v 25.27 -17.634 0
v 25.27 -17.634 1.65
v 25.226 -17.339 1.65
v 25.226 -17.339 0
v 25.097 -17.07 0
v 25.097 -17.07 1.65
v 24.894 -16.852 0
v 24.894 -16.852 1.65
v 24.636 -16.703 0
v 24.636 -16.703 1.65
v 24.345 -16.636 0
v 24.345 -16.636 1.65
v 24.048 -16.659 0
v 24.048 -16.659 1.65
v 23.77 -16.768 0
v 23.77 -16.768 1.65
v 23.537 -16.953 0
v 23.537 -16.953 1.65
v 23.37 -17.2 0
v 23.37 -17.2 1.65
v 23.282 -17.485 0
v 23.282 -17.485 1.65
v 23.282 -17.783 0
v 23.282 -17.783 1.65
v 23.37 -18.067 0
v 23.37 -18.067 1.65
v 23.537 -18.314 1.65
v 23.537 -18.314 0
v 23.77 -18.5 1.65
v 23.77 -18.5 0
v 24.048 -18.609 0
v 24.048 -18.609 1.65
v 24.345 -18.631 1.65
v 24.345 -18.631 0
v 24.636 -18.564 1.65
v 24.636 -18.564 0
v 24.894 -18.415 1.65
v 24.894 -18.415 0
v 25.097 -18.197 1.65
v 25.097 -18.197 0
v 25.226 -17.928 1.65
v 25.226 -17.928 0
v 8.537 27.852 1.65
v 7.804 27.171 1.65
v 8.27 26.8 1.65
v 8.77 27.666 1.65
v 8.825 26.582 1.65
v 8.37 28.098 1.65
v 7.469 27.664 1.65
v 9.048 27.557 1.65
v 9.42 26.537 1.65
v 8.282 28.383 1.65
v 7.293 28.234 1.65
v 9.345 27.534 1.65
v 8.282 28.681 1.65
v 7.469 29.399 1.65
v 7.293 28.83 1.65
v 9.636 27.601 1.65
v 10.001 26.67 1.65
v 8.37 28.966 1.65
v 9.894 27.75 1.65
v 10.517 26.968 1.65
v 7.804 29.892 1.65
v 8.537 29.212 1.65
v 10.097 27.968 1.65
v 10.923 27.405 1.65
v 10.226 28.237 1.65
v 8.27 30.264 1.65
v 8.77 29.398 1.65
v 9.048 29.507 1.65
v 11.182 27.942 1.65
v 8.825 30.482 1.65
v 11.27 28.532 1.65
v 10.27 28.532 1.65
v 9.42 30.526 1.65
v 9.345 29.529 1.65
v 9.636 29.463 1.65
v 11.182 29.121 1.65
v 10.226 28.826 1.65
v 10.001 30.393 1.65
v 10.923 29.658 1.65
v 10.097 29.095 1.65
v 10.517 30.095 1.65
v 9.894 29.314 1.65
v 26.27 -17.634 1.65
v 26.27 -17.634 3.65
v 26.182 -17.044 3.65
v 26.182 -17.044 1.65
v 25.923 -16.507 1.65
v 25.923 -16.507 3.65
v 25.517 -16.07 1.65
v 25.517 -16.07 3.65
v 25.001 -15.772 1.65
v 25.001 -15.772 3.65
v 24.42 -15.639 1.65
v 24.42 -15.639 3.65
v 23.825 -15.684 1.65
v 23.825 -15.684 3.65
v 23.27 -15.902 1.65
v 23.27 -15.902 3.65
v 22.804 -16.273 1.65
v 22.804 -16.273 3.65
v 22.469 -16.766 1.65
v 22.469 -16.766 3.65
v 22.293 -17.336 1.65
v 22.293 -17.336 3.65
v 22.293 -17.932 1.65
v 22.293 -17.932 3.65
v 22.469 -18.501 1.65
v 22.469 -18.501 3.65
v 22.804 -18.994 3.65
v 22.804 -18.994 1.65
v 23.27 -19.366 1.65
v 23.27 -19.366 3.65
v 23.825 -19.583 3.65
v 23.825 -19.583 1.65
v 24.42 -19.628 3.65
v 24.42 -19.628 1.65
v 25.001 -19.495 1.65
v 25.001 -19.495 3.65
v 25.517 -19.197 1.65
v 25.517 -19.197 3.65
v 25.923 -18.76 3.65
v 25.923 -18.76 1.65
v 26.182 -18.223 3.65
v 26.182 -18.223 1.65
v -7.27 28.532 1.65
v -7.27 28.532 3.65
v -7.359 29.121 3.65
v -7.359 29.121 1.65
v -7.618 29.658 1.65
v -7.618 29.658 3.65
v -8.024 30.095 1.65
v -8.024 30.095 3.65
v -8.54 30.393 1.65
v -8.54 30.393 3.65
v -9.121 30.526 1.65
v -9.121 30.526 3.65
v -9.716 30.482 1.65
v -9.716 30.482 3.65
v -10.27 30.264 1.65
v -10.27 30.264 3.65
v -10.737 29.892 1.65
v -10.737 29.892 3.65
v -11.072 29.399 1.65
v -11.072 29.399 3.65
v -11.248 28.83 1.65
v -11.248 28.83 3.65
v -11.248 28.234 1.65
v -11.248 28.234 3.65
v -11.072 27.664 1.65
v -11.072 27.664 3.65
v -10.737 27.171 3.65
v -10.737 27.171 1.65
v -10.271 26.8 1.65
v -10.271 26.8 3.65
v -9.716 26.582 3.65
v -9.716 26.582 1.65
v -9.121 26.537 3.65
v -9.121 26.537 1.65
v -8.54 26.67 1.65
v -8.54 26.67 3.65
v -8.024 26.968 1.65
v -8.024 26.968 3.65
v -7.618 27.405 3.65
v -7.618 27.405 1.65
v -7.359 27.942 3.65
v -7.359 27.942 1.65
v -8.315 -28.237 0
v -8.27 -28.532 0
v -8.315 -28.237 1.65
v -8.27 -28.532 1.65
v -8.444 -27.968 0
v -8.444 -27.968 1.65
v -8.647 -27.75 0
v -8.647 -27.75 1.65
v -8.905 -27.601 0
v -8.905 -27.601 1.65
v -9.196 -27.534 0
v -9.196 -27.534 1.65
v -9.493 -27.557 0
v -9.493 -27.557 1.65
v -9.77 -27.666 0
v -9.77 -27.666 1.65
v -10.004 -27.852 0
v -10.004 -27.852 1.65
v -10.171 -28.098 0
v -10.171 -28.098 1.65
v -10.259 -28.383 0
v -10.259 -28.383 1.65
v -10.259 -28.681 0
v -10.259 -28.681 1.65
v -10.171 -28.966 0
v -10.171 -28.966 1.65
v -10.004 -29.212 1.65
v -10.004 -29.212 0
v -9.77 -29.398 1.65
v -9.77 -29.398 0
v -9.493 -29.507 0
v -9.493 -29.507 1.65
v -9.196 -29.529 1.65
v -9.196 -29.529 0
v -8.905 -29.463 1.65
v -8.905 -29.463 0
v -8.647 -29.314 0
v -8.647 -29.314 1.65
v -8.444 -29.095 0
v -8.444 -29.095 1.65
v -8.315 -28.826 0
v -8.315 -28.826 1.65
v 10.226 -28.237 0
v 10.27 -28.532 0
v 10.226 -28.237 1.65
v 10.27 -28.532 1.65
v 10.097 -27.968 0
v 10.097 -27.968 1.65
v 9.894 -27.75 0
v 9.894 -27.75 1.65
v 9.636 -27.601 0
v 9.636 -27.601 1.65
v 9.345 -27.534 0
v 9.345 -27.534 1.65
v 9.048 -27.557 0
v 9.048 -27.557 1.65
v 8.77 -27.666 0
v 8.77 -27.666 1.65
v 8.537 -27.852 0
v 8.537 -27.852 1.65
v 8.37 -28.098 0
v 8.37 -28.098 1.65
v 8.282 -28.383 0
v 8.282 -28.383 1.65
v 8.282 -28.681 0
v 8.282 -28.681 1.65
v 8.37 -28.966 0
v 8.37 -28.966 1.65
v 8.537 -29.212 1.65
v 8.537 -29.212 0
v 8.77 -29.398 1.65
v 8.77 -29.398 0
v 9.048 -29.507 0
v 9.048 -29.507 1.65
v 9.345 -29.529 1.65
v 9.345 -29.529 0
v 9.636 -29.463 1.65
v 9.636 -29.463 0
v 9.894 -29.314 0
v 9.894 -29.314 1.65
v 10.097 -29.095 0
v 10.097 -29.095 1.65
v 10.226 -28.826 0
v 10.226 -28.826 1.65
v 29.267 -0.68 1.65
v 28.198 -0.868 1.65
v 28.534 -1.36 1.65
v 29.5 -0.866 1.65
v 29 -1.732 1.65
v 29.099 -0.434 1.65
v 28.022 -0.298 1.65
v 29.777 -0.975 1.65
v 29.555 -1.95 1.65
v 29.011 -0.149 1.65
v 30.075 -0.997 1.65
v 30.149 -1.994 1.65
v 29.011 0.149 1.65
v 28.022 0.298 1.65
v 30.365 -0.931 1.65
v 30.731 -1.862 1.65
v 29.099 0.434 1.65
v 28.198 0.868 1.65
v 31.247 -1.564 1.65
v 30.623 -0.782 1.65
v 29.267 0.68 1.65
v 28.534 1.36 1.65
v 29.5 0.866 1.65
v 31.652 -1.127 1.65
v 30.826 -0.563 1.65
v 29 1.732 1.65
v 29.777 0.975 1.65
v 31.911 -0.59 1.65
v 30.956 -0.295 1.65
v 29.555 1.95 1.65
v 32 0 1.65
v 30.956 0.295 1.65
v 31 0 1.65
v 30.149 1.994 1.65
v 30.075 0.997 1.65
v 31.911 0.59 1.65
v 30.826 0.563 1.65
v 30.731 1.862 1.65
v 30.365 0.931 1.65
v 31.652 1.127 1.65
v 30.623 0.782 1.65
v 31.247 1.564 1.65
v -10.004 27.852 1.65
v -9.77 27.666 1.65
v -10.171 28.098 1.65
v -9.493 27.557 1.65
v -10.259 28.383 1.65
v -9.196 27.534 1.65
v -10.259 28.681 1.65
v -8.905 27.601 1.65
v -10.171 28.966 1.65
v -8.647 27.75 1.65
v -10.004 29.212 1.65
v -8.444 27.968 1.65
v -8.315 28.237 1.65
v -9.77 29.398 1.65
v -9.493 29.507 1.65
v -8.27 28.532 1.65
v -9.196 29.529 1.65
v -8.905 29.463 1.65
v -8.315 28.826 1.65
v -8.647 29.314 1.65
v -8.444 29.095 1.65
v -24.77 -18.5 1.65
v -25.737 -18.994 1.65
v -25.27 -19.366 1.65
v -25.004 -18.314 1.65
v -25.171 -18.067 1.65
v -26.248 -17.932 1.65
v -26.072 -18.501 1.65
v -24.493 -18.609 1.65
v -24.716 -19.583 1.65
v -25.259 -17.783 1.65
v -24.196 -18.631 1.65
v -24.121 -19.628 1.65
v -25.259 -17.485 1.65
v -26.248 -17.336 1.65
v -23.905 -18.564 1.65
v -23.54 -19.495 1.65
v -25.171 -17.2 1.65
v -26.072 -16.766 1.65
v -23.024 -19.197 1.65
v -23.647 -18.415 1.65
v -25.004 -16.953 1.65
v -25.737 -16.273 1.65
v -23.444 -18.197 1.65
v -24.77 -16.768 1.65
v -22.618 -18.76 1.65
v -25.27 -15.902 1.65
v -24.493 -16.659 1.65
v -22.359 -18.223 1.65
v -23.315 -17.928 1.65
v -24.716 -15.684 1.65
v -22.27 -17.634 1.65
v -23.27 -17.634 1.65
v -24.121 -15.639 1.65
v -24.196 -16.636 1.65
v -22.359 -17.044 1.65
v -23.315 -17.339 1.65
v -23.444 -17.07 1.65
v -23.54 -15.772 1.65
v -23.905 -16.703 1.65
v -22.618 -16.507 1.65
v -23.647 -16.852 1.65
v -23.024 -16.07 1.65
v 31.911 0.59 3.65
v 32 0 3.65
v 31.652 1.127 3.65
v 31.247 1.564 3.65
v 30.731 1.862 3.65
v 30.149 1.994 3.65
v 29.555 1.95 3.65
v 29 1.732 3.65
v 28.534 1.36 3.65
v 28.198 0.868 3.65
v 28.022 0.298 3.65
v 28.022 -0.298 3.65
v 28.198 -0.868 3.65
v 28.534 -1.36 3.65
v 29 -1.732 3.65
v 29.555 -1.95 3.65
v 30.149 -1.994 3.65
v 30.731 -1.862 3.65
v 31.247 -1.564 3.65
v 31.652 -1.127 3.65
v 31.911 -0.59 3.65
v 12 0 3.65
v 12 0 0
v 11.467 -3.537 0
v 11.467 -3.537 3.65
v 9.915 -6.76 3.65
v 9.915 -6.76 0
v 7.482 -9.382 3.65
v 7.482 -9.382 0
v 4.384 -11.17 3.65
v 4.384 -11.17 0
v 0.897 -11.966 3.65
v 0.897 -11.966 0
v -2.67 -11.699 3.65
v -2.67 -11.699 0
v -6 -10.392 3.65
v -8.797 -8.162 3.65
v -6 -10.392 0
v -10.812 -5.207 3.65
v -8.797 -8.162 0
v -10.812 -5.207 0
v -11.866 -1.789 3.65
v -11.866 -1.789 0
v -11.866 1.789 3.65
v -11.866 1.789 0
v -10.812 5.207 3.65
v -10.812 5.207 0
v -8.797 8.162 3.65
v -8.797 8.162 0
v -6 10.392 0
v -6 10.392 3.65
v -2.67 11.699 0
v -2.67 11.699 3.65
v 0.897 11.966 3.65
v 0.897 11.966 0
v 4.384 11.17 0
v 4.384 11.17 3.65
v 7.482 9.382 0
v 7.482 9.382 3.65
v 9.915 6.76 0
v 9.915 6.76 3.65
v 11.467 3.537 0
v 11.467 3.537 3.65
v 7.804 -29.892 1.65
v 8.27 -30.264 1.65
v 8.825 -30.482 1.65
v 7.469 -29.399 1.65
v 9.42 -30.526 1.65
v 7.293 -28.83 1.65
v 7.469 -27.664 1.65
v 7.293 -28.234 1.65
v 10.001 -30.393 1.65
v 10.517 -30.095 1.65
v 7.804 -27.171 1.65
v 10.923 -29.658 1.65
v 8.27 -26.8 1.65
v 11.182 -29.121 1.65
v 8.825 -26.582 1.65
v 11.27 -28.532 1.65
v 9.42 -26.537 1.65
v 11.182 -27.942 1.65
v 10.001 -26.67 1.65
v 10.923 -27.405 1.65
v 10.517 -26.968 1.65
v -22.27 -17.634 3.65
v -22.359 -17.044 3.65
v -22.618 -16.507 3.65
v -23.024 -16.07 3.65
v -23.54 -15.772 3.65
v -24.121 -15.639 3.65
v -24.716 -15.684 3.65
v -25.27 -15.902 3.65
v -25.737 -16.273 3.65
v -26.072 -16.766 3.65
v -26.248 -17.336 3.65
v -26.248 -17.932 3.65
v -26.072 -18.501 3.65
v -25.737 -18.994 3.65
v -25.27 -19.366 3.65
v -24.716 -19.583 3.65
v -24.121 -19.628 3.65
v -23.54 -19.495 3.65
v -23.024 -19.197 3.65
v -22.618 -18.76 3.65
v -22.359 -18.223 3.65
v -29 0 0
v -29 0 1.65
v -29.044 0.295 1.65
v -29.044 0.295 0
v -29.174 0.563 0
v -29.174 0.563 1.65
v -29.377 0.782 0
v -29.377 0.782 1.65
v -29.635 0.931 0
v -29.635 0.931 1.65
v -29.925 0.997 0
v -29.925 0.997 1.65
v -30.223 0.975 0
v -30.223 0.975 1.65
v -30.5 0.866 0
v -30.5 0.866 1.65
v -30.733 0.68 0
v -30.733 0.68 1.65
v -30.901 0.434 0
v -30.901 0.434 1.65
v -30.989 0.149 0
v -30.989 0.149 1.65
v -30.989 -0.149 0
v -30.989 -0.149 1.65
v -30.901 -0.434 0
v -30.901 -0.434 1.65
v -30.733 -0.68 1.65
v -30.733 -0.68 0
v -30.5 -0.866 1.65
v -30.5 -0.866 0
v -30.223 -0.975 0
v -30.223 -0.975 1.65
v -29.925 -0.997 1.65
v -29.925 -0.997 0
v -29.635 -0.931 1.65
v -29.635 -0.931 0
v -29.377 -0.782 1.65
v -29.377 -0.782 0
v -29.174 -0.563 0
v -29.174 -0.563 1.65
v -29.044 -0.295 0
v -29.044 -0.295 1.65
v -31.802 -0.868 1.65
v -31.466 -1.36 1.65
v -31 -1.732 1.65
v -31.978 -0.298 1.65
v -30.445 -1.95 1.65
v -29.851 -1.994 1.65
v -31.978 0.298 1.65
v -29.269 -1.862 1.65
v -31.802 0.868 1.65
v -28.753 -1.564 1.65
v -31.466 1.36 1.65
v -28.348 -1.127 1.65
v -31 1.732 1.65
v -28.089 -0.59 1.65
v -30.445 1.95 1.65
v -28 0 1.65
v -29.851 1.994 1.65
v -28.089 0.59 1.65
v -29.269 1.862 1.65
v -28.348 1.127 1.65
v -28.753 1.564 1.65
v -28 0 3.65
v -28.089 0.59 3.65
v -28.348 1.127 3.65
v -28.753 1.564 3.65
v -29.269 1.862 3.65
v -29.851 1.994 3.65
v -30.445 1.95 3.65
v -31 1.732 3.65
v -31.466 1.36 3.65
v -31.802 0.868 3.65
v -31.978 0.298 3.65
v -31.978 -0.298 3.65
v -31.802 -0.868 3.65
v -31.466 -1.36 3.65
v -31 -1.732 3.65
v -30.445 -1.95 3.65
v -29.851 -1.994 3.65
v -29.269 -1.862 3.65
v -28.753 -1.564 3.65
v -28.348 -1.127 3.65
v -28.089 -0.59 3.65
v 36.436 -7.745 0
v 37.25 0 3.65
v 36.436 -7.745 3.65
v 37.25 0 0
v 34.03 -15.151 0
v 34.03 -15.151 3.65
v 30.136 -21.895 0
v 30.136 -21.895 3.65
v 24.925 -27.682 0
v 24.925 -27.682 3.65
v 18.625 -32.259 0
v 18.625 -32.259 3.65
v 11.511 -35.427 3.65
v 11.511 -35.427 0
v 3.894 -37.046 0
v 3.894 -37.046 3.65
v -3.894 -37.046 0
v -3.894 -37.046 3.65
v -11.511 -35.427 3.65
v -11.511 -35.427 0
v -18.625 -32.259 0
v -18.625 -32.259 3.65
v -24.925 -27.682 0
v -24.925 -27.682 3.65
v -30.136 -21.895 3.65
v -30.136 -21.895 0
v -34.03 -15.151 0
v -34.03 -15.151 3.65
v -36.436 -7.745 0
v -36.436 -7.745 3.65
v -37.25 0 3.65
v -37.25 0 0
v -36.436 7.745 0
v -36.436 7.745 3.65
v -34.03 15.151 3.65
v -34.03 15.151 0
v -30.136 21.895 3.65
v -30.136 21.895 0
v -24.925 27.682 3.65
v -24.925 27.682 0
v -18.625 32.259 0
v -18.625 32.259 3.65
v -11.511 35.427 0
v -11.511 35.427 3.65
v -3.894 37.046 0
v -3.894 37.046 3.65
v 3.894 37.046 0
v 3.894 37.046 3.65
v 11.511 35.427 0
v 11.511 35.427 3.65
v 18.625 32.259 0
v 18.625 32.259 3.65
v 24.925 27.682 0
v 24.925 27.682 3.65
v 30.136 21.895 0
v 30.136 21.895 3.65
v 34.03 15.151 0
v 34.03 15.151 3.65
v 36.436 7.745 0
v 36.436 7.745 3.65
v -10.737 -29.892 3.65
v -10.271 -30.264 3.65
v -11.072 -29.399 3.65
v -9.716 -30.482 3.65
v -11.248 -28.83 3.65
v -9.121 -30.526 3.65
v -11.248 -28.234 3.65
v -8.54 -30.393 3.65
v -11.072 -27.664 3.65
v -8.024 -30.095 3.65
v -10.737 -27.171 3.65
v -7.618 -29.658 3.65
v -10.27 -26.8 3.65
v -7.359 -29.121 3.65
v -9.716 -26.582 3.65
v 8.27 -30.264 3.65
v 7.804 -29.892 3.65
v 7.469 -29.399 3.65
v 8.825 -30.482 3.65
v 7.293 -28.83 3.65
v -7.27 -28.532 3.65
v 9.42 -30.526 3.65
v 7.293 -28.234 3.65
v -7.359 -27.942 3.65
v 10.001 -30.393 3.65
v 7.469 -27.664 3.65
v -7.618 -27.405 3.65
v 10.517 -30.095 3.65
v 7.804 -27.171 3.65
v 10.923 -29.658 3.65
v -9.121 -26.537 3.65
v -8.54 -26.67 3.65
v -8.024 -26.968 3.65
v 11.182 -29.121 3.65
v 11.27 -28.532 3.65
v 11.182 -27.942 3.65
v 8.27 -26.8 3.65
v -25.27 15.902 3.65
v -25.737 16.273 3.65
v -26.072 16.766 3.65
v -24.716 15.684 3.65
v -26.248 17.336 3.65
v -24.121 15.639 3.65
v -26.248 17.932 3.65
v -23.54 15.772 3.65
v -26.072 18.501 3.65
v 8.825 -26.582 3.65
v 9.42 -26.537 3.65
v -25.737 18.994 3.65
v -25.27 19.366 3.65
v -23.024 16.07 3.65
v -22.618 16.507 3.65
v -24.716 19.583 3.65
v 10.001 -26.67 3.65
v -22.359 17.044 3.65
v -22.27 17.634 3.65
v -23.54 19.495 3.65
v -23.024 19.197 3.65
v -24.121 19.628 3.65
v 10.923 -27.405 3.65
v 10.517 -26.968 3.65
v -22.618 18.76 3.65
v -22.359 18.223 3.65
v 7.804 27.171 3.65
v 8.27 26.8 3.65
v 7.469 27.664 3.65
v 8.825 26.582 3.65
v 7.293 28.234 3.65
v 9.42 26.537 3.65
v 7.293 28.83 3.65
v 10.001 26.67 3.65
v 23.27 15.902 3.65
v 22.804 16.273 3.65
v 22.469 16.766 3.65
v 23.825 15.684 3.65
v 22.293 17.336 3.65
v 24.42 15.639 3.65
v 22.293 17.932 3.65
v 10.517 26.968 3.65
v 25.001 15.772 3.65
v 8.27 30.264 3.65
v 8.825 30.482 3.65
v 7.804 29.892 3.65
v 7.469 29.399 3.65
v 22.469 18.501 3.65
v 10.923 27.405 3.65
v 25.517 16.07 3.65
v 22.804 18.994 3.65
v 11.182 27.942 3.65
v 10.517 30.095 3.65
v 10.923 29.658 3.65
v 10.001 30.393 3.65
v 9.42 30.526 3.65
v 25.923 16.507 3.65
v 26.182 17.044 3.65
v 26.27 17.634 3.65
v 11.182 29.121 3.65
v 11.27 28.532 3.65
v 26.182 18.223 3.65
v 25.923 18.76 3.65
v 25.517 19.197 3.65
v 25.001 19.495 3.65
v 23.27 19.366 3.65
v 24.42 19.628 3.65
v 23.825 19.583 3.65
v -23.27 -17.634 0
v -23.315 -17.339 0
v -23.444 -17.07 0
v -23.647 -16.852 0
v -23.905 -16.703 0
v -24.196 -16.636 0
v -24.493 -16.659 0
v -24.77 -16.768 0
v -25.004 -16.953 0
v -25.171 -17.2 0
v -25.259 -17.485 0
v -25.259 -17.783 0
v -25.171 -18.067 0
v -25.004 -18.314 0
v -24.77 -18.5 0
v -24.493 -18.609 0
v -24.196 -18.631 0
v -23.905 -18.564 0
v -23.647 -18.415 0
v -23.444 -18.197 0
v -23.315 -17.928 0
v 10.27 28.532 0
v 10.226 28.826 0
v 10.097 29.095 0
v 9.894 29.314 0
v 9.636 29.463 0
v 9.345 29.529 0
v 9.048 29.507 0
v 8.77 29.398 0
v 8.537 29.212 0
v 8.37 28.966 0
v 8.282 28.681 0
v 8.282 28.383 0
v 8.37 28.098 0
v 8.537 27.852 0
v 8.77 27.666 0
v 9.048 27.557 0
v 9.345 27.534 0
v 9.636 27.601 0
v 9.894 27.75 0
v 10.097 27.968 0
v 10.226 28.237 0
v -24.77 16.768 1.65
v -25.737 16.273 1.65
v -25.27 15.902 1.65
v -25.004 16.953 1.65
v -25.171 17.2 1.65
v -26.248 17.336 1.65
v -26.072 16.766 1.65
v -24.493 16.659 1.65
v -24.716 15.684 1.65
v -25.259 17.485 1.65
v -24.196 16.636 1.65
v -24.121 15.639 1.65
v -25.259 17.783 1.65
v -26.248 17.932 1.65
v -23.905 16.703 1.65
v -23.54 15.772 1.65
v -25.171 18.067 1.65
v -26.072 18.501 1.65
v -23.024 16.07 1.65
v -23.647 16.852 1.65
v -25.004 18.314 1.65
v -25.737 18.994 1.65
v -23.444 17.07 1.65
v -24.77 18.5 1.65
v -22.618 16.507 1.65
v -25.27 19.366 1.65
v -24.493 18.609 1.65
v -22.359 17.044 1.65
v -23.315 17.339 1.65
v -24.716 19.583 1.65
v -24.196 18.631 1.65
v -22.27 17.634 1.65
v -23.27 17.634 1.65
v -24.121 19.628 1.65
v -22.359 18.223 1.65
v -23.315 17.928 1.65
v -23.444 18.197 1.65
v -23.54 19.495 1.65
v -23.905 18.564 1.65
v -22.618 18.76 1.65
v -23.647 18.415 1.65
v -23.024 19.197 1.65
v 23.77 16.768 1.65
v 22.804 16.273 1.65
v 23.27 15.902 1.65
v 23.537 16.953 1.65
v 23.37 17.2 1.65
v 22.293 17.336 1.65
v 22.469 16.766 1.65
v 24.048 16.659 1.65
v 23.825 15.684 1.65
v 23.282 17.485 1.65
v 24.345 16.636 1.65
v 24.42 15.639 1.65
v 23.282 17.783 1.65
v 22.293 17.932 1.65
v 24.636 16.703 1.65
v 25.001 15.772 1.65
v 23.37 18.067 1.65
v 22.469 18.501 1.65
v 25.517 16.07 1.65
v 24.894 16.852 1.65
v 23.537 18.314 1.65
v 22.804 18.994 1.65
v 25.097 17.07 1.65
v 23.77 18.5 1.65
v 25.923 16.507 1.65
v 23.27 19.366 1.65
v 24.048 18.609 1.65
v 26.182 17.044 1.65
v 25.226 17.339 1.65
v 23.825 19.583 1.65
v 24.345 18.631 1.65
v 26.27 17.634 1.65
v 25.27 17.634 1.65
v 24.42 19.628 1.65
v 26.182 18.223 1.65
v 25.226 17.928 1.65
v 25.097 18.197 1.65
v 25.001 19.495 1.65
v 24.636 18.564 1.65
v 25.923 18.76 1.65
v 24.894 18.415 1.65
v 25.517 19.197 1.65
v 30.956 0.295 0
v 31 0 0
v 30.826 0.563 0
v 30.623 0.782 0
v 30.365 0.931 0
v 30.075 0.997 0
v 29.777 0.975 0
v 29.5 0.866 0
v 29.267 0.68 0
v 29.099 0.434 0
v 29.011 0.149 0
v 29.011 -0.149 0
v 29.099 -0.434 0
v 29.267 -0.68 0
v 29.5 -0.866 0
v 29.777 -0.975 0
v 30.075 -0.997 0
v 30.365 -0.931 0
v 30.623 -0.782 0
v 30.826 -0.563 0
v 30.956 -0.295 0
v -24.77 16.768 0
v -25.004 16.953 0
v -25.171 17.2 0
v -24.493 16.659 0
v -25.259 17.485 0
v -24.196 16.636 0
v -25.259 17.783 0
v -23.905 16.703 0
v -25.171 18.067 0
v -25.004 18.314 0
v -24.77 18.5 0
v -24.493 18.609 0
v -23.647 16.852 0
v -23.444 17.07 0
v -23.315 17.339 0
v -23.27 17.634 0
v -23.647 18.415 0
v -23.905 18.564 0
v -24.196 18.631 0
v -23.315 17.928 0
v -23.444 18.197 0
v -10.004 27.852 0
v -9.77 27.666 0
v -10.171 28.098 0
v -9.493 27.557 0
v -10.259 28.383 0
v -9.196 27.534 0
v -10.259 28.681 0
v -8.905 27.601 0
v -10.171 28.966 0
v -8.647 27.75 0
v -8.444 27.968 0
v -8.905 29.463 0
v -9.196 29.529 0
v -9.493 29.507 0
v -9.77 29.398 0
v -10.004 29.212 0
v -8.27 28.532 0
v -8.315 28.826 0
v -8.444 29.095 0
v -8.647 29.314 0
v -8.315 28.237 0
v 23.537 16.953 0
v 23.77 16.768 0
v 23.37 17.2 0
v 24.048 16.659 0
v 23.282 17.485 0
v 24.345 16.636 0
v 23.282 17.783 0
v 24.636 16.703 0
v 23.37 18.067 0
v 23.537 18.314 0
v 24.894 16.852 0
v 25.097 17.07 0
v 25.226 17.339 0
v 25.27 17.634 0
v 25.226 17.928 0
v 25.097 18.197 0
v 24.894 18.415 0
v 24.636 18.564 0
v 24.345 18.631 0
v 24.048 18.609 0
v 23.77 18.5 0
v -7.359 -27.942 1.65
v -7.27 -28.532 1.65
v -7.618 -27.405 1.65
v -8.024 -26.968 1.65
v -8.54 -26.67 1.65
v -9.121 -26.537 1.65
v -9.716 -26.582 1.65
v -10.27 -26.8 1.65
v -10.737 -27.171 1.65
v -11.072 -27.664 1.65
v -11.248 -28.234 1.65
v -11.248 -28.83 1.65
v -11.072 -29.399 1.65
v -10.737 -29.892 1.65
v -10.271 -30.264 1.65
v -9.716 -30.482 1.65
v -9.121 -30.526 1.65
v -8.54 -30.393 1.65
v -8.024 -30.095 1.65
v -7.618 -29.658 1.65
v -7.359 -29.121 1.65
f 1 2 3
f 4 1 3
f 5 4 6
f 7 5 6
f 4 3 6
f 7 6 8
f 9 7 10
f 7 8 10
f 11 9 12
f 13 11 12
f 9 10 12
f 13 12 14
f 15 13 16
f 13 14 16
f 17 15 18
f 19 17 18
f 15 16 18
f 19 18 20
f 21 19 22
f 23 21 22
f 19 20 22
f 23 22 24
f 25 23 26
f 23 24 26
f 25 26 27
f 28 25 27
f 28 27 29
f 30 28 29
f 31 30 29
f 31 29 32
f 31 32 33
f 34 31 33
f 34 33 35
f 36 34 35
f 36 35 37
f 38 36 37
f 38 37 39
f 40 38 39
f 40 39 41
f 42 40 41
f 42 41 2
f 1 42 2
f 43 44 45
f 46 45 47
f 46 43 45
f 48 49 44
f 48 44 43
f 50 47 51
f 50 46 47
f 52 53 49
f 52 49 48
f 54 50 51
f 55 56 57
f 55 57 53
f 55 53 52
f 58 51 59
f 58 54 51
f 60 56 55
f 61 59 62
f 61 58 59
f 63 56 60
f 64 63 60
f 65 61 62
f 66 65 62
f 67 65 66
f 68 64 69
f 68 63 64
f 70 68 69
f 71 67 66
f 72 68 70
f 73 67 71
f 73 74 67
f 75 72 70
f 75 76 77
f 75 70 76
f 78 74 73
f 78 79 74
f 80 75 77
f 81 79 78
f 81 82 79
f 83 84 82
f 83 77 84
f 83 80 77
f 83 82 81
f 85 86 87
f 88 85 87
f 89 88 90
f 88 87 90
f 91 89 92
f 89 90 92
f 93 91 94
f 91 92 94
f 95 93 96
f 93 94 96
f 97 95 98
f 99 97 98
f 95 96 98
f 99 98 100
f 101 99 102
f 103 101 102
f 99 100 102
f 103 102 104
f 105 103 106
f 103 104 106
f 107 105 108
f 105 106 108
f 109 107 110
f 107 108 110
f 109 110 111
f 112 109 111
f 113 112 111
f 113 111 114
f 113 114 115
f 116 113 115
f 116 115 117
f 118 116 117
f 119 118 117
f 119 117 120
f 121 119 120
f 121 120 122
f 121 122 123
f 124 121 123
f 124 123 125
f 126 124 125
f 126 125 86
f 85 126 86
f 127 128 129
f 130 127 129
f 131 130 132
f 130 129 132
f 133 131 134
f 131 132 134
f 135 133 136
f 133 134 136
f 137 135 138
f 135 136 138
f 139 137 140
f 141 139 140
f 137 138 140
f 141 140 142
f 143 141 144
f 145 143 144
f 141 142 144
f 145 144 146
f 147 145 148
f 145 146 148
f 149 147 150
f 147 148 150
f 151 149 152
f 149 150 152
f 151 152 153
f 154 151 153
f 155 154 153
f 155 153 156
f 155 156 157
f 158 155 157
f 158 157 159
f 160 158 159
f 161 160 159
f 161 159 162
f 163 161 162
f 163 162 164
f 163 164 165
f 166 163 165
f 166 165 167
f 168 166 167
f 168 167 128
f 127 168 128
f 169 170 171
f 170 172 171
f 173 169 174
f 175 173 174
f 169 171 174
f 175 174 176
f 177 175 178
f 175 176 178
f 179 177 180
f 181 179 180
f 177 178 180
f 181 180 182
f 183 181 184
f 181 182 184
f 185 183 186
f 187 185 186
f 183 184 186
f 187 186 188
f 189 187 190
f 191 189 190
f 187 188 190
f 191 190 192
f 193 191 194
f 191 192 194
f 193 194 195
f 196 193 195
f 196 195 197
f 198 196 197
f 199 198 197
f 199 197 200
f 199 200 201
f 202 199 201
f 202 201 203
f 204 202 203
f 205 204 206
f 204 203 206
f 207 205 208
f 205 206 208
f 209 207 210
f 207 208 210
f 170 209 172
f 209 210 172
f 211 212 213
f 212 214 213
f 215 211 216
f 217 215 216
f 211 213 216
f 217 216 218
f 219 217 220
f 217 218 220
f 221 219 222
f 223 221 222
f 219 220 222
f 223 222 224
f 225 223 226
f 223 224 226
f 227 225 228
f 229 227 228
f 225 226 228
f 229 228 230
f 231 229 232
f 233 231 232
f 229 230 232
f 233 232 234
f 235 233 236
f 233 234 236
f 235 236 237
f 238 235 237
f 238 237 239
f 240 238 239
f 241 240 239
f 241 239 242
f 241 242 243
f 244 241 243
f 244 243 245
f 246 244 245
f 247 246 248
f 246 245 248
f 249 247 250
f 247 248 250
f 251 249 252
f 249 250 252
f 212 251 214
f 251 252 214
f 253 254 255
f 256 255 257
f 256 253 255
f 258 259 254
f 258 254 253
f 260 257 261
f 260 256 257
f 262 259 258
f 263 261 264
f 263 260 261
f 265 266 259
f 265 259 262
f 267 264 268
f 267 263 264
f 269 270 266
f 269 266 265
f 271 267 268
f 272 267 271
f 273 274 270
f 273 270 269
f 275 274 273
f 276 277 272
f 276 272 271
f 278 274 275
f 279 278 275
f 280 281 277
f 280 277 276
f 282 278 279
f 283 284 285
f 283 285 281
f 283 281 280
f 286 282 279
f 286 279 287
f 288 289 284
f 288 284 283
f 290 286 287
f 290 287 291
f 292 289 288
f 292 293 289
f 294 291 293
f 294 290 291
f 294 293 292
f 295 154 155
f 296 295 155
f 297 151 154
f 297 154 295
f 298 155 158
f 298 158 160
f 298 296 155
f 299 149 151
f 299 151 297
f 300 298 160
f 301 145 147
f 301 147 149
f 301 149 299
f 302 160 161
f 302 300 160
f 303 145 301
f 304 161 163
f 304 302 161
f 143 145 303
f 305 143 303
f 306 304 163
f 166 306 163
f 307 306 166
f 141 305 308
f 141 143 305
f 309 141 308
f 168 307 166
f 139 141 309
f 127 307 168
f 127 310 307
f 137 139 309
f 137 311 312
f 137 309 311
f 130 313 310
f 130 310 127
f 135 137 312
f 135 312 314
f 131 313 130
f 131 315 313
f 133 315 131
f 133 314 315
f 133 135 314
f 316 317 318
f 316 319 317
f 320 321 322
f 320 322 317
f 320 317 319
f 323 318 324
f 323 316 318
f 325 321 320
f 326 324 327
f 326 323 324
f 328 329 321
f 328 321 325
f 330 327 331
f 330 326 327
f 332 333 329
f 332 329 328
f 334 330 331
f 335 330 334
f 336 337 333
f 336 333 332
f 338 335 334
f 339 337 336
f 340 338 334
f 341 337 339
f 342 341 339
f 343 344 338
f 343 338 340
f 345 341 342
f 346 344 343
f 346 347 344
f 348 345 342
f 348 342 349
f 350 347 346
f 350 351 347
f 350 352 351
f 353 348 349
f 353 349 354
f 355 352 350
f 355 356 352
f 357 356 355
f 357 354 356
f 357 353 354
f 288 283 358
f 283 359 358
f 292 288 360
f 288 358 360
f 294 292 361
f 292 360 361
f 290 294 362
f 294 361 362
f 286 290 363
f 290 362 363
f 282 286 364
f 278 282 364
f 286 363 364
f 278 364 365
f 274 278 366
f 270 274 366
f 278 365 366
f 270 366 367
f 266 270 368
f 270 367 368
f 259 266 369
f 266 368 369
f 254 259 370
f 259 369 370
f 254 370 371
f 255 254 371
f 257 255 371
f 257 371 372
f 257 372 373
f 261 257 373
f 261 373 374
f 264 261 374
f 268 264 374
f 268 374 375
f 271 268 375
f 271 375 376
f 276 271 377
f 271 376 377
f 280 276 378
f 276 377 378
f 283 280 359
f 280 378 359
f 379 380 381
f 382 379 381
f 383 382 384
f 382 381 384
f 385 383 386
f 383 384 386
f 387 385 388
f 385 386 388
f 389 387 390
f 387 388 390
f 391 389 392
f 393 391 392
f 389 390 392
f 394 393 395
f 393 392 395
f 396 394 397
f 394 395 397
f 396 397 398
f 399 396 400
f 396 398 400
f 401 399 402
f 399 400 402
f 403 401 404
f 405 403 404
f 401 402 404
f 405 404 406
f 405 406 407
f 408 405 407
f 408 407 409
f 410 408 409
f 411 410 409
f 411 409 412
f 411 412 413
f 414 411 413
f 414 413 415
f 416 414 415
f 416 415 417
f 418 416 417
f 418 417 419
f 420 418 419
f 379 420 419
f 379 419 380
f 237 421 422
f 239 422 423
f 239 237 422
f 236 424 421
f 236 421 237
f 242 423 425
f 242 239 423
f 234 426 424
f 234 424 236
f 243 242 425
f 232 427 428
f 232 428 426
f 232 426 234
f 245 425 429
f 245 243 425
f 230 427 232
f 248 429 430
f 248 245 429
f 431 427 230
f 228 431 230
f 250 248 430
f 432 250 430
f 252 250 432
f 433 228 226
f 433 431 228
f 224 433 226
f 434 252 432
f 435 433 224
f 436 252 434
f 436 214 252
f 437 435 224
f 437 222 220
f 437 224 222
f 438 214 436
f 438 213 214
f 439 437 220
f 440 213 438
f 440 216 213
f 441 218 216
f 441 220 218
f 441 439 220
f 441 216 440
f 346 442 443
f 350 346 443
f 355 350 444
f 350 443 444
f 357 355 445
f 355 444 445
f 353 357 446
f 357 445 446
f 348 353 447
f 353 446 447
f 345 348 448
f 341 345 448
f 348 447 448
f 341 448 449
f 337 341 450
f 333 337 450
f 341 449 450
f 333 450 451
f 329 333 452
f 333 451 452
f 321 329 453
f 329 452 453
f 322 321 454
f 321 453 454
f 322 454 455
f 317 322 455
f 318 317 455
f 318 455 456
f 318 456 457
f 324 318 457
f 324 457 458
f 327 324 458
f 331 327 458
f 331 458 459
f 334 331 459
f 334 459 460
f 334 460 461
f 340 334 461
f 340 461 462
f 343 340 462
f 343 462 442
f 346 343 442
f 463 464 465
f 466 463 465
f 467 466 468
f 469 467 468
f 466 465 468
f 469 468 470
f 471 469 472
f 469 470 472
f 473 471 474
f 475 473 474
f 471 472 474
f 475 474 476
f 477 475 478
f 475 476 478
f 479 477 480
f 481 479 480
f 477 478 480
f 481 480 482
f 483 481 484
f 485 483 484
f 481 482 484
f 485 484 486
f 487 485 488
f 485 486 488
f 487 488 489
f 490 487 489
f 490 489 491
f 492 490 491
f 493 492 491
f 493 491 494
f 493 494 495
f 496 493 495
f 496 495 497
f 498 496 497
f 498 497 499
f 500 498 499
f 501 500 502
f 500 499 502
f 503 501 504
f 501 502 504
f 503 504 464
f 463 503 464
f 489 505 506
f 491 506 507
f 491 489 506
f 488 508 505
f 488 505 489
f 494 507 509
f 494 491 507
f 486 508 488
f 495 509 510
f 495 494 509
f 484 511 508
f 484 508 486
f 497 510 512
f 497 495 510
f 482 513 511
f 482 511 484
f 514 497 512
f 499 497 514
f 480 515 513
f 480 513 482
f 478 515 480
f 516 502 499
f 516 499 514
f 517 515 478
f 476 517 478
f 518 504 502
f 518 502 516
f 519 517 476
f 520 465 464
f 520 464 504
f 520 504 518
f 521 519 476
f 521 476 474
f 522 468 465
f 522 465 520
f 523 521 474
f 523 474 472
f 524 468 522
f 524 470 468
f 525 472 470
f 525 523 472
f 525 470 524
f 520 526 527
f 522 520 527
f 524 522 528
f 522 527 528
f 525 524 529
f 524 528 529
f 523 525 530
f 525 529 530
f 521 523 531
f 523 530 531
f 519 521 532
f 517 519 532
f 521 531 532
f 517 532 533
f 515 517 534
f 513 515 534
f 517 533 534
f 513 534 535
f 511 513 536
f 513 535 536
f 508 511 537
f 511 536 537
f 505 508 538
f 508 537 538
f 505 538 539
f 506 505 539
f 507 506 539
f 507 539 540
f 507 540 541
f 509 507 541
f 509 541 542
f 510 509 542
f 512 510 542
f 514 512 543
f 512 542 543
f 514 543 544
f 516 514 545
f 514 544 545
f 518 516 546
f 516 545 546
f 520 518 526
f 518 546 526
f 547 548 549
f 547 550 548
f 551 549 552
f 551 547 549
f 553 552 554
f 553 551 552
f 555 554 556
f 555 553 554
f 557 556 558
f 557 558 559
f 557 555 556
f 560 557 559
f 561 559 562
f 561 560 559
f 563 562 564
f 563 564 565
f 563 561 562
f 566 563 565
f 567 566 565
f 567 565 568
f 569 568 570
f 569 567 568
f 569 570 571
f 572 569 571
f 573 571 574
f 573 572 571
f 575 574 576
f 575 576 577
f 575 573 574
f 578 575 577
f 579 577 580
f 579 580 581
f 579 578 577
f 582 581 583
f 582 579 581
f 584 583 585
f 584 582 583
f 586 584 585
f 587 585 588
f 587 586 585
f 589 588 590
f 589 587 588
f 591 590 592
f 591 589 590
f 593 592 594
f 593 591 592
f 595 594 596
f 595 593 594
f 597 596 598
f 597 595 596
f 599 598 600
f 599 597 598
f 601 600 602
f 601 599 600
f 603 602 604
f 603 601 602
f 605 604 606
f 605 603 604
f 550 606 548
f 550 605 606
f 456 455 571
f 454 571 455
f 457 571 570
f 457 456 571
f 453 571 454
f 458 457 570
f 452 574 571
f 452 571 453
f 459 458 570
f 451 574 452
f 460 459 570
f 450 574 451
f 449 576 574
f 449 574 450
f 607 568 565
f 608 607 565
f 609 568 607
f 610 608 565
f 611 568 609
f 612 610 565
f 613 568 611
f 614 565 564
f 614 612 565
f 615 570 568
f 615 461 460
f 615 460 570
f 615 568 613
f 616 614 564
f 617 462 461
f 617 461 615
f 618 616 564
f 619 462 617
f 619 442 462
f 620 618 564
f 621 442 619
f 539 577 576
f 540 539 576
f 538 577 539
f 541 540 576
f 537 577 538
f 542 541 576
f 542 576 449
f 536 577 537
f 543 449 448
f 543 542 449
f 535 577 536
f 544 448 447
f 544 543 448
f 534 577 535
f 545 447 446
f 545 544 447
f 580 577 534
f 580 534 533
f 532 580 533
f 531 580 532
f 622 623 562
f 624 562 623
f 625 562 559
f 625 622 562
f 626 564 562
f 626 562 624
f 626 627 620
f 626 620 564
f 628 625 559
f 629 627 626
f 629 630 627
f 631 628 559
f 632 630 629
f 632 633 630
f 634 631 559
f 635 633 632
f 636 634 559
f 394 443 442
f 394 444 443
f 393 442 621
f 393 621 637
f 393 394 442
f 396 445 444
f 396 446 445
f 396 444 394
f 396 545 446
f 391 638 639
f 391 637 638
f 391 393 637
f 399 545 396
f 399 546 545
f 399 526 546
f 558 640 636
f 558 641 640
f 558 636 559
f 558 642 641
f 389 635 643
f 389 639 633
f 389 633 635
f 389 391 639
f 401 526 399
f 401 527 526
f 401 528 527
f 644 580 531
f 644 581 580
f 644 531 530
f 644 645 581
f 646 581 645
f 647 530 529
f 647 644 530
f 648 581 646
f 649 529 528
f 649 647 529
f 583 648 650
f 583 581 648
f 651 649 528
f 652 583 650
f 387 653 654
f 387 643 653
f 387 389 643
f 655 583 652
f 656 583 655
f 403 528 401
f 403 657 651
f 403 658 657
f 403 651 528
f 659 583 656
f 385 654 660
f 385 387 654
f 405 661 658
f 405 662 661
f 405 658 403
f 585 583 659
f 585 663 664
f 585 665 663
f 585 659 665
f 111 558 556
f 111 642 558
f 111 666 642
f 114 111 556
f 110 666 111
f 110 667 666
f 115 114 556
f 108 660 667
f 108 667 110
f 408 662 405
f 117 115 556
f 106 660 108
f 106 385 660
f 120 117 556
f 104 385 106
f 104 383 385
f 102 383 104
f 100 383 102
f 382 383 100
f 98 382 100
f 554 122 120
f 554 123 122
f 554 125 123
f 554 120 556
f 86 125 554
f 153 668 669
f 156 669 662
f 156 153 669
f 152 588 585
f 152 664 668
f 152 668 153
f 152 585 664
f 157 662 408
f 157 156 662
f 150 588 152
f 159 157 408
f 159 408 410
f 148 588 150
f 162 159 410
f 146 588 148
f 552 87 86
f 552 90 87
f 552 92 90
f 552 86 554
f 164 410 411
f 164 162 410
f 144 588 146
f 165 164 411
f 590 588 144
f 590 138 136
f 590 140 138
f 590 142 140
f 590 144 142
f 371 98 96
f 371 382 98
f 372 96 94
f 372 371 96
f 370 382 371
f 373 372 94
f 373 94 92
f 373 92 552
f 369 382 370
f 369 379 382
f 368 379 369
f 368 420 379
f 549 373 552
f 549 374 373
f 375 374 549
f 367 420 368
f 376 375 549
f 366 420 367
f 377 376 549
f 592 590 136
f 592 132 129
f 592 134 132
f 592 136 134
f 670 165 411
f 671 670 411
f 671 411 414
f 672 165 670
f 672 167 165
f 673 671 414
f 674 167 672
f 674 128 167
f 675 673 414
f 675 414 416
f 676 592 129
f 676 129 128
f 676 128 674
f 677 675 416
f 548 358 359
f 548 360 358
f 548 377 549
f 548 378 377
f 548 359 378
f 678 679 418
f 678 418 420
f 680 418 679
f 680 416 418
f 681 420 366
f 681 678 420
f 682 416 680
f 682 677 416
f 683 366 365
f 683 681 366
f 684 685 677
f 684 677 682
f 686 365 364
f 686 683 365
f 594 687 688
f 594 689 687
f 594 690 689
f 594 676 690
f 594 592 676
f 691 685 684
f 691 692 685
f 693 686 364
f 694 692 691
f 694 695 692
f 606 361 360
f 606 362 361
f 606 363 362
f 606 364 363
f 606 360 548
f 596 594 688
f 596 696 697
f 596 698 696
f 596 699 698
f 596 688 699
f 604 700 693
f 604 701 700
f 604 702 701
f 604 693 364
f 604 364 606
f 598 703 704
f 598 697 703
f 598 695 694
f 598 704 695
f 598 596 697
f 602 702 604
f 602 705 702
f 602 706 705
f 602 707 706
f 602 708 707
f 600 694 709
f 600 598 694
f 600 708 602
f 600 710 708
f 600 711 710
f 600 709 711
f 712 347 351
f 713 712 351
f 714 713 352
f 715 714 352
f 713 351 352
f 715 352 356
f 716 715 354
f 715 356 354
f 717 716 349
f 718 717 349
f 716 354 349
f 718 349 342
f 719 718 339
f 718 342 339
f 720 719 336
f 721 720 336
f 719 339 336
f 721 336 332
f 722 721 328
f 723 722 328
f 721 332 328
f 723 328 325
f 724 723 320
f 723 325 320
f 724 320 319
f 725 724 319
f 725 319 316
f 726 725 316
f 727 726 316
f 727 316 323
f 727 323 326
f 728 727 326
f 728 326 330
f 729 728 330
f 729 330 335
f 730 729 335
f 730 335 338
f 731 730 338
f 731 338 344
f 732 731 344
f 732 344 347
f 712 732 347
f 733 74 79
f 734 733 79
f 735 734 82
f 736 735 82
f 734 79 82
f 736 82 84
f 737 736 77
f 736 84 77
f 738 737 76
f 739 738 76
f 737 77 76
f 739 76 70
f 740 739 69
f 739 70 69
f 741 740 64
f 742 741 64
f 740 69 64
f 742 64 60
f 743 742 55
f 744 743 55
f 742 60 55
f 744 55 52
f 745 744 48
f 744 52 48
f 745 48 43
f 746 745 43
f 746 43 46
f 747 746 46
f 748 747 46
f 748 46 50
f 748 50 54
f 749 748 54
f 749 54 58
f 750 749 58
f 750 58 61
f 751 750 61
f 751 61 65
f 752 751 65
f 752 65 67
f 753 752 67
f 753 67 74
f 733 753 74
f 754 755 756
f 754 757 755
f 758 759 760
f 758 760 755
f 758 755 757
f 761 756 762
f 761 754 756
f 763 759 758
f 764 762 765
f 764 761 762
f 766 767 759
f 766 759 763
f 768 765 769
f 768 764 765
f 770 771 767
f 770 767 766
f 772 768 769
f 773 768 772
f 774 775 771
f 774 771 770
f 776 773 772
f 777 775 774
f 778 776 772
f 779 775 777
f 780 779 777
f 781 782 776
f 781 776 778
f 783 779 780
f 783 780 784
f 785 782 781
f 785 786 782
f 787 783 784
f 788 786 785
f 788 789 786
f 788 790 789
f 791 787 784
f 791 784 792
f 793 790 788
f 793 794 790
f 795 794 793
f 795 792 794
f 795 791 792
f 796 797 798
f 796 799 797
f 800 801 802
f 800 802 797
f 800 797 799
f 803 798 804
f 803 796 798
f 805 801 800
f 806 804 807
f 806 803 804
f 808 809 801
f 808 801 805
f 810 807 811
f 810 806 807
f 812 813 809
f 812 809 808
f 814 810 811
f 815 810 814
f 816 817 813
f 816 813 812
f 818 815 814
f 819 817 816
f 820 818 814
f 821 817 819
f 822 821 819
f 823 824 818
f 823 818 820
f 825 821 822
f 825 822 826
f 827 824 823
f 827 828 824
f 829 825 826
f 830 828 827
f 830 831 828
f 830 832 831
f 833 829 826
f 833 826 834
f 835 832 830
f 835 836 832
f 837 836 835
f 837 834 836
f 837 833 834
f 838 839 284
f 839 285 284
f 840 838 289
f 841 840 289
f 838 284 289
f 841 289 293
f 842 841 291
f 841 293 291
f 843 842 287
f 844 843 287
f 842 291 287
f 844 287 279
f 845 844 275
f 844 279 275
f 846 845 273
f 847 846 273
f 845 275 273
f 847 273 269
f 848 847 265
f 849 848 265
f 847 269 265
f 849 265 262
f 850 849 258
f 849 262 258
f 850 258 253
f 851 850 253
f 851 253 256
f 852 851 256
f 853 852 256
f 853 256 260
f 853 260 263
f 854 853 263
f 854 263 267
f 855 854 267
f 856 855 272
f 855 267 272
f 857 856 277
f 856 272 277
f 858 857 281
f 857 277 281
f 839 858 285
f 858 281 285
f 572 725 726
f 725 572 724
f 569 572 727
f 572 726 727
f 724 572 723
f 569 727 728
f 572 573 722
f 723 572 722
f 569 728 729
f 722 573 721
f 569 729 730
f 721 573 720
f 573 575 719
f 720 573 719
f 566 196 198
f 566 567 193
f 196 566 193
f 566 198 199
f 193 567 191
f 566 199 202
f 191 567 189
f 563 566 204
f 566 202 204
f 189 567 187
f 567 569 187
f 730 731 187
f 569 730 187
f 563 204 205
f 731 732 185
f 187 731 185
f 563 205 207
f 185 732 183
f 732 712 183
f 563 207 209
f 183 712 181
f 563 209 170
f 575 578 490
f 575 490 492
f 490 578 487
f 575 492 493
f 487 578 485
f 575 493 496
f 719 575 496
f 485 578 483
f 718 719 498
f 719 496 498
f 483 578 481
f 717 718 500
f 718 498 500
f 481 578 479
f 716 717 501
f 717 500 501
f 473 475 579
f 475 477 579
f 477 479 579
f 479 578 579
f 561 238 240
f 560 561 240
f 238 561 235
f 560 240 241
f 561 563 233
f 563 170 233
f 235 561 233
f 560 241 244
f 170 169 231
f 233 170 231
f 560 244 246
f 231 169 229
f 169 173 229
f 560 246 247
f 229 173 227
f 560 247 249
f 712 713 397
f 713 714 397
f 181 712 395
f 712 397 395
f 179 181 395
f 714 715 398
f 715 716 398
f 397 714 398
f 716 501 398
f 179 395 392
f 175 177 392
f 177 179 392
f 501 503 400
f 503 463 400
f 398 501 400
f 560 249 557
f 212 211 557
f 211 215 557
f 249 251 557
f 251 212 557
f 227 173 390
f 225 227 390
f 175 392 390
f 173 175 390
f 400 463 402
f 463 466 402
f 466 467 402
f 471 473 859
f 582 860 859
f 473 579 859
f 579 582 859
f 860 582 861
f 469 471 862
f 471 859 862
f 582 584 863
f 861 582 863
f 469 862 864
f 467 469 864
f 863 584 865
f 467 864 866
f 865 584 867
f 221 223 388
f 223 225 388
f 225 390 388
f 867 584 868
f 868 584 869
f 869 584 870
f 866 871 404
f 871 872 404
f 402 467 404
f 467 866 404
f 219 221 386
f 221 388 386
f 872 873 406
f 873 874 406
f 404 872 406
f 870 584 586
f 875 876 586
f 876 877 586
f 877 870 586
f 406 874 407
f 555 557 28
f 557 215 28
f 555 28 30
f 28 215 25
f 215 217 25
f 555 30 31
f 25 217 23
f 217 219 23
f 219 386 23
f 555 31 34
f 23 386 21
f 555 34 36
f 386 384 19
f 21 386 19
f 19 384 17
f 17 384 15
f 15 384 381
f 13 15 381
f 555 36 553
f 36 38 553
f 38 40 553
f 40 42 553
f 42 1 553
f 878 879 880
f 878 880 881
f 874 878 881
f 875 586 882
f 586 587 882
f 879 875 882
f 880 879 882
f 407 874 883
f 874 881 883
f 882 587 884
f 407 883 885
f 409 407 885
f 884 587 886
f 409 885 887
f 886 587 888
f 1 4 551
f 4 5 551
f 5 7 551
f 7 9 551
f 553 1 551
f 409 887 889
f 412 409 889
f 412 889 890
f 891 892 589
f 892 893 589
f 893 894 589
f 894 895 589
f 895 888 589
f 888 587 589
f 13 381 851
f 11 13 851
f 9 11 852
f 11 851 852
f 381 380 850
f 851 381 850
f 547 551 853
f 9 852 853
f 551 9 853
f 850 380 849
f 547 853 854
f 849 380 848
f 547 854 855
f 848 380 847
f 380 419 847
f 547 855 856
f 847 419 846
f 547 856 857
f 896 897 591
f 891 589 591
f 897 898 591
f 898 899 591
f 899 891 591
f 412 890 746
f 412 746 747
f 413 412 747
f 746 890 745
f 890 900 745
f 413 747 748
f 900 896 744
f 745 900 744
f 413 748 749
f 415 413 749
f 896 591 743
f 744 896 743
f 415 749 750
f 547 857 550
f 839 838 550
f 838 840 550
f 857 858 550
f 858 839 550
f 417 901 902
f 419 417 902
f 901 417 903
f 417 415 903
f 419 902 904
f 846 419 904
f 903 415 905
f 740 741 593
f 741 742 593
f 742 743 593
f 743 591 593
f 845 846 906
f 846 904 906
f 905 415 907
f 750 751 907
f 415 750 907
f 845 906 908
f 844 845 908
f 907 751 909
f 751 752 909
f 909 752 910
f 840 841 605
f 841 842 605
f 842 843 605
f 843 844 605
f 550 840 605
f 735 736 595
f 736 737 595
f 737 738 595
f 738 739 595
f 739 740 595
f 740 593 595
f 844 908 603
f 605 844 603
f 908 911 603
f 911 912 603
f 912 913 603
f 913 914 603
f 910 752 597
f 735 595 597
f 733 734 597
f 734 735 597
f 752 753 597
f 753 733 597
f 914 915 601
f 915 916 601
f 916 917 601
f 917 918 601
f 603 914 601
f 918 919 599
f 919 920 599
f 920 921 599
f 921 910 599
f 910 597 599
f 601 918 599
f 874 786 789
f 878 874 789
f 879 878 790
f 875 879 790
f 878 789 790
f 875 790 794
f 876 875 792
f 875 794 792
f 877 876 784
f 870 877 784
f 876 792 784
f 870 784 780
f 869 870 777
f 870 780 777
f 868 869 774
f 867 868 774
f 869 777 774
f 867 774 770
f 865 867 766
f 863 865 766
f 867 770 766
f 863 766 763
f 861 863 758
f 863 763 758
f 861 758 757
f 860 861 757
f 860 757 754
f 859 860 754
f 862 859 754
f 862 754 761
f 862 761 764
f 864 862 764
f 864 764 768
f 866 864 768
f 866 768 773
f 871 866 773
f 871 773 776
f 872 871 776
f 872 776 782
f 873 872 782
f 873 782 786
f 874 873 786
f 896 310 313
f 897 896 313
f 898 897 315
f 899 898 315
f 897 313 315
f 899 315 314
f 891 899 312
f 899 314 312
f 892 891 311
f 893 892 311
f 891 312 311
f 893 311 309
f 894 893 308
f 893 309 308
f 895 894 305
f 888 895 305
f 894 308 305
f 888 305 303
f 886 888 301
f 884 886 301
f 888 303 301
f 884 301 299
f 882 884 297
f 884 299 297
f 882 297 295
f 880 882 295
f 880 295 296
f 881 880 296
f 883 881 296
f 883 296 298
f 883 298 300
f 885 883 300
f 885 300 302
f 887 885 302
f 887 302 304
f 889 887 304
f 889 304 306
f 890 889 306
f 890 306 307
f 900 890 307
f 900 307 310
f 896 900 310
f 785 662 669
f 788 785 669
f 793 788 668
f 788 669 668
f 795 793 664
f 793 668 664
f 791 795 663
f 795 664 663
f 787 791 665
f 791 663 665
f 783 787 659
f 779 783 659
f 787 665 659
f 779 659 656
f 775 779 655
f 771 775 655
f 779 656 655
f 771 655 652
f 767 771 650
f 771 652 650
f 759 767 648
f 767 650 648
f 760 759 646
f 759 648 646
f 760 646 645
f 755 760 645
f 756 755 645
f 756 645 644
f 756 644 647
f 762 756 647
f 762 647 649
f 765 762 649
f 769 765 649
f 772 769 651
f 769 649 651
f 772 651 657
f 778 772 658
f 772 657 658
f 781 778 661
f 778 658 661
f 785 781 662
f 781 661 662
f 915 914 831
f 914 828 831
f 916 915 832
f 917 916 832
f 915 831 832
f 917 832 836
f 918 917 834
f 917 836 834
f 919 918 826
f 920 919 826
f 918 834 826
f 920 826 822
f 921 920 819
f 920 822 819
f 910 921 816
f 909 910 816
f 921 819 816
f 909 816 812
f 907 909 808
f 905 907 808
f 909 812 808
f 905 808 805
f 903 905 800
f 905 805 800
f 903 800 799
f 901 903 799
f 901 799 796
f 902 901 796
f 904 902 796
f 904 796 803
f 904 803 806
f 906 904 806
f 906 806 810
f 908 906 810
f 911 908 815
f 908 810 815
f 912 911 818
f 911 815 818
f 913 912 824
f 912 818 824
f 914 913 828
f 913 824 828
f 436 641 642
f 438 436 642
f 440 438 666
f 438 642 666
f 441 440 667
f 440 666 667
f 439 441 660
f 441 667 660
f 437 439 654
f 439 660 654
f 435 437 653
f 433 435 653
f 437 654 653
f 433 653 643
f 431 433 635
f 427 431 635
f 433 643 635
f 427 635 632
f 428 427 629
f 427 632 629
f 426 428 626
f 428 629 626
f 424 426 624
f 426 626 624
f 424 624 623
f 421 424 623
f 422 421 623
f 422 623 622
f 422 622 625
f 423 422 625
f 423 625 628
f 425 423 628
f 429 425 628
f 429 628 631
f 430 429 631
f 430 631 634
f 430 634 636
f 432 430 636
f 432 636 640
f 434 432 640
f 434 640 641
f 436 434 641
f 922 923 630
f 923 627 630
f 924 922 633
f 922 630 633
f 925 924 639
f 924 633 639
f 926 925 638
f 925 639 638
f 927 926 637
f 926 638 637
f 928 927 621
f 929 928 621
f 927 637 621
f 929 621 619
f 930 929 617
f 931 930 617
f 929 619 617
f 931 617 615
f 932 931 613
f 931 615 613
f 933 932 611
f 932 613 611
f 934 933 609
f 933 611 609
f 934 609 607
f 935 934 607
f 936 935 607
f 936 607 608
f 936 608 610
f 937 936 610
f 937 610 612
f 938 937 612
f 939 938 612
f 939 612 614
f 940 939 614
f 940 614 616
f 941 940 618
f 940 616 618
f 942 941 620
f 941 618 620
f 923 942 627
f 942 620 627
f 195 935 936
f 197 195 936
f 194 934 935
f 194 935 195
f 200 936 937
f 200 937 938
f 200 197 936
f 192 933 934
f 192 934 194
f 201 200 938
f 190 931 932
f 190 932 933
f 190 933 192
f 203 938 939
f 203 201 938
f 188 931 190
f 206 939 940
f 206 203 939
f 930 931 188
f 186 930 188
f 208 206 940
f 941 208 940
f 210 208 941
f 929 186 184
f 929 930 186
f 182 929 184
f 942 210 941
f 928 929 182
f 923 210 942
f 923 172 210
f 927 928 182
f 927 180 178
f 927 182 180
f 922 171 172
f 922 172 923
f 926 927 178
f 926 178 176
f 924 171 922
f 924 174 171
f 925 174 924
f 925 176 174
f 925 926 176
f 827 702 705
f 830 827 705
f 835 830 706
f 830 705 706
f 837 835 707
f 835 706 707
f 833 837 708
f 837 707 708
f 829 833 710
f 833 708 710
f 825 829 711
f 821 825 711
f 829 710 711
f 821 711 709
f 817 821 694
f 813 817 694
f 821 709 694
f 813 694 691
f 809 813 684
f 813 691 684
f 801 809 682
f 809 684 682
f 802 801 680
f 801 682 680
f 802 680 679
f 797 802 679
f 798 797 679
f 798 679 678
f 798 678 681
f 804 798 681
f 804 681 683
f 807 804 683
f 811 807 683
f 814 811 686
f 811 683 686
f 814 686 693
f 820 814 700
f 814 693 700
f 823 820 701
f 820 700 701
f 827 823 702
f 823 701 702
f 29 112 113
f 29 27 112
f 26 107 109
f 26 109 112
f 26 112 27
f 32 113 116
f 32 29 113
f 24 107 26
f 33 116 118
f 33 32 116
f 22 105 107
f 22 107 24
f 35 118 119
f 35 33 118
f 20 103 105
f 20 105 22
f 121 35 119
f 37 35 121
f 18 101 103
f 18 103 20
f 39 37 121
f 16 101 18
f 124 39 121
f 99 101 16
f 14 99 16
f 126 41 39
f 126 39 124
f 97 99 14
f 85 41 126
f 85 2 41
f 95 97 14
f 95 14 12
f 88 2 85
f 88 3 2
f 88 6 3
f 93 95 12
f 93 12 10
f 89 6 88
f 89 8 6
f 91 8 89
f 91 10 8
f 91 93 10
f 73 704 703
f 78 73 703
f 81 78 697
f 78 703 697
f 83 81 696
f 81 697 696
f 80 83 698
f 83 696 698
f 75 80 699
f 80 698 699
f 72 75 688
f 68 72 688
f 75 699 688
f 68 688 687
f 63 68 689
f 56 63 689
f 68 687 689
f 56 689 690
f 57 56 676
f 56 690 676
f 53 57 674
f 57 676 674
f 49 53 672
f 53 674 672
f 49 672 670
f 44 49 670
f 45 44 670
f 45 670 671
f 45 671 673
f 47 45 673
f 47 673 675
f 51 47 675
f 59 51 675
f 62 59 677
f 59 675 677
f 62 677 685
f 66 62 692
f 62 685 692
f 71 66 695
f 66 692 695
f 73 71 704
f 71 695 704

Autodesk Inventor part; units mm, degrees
ref_plane "YZ Plane" through (0, 0, 0) normal (1, 0, 0) x (0, 1, 0)
ref_plane "XZ Plane" through (0, 0, 0) normal (0, 1, 0) x (-1, 0, 0)
ref_plane "XY Plane" through (0, 0, 0) normal (0, 0, 1) x (1, 0, 0)
sketch "Sketch1" plane through (0, 0, 0) normal (0, 0, 1) x (1, 0, 0)
  circle A0 centre (0, 0) radius 37.25
  circle A1 centre (0, 0) radius 12
  dimension "d0" = 74.5
  dimension "d1" = 24
extrude "Extrusion1" add sketch "Sketch1" along normal blind 10
sketch "Sketch7" plane through (0, 0, 10) normal (0, 0, 1) x (1, 0, 0)
  circle A0 centre (0, 0) radius 22
  circle A1 centre (0, 0) radius 38
  dimension "d32" = 44
  dimension "d33" = 76
extrude "Extrusion6" cut sketch "Sketch7" against normal blind 6.35 contours A0 | A1
sketch "Sketch9" plane through (0, 0, 3.65) normal (0, 0, 1) x (1, 0, 0)
  circle A0 centre (30, 0) radius 1
  circle A1 centre (24.2705, 17.6336) radius 1
  circle A2 centre (9.2705, 28.5317) radius 1
  circle A3 centre (-9.2705, 28.5317) radius 1
  circle A4 centre (-24.2705, 17.6336) radius 1
  circle A5 centre (-30, 0) radius 1
  circle A6 centre (-24.2705, -17.6336) radius 1
  circle A7 centre (-9.2705, -28.5317) radius 1
  circle A8 centre (9.2705, -28.5317) radius 1
  circle A9 centre (24.2705, -17.6336) radius 1
  point P0 (0, 0)
  dimension "d44" = 2
  dimension "d45" = 30
  dimension "d48" = 360
extrude "Extrusion8" cut sketch "Sketch9" against normal through all
sketch "Sketch10" plane through (0, 0, 3.65) normal (0, 0, 1) x (1, 0, 0)
  circle A0 centre (30, 0) radius 1 projected
  circle A1 centre (30, 0) radius 1 projected
  circle A2 centre (30, 0) radius 2
  circle A3 centre (24.2705, 17.6336) radius 2
  circle A4 centre (9.2705, 28.5317) radius 2
  circle A5 centre (-9.2705, 28.5317) radius 2
  circle A6 centre (-24.2705, 17.6336) radius 2
  circle A7 centre (-30, 0) radius 2
  circle A8 centre (-24.2705, -17.6336) radius 2
  circle A9 centre (-9.2705, -28.5317) radius 2
  circle A10 centre (9.2705, -28.5317) radius 2
  circle A11 centre (24.2705, -17.6336) radius 2
  point P0 (0, 0)
  dimension "d52" = 4
  dimension "d55" = 360
extrude "Extrusion9" cut sketch "Sketch10" against normal blind 2 contours A0 | A2 | A3 | A4 | A5 | A6 | A7 | A8 | A9 | A10 | A11
properties part number "SG01" material "ABS Plastic"
